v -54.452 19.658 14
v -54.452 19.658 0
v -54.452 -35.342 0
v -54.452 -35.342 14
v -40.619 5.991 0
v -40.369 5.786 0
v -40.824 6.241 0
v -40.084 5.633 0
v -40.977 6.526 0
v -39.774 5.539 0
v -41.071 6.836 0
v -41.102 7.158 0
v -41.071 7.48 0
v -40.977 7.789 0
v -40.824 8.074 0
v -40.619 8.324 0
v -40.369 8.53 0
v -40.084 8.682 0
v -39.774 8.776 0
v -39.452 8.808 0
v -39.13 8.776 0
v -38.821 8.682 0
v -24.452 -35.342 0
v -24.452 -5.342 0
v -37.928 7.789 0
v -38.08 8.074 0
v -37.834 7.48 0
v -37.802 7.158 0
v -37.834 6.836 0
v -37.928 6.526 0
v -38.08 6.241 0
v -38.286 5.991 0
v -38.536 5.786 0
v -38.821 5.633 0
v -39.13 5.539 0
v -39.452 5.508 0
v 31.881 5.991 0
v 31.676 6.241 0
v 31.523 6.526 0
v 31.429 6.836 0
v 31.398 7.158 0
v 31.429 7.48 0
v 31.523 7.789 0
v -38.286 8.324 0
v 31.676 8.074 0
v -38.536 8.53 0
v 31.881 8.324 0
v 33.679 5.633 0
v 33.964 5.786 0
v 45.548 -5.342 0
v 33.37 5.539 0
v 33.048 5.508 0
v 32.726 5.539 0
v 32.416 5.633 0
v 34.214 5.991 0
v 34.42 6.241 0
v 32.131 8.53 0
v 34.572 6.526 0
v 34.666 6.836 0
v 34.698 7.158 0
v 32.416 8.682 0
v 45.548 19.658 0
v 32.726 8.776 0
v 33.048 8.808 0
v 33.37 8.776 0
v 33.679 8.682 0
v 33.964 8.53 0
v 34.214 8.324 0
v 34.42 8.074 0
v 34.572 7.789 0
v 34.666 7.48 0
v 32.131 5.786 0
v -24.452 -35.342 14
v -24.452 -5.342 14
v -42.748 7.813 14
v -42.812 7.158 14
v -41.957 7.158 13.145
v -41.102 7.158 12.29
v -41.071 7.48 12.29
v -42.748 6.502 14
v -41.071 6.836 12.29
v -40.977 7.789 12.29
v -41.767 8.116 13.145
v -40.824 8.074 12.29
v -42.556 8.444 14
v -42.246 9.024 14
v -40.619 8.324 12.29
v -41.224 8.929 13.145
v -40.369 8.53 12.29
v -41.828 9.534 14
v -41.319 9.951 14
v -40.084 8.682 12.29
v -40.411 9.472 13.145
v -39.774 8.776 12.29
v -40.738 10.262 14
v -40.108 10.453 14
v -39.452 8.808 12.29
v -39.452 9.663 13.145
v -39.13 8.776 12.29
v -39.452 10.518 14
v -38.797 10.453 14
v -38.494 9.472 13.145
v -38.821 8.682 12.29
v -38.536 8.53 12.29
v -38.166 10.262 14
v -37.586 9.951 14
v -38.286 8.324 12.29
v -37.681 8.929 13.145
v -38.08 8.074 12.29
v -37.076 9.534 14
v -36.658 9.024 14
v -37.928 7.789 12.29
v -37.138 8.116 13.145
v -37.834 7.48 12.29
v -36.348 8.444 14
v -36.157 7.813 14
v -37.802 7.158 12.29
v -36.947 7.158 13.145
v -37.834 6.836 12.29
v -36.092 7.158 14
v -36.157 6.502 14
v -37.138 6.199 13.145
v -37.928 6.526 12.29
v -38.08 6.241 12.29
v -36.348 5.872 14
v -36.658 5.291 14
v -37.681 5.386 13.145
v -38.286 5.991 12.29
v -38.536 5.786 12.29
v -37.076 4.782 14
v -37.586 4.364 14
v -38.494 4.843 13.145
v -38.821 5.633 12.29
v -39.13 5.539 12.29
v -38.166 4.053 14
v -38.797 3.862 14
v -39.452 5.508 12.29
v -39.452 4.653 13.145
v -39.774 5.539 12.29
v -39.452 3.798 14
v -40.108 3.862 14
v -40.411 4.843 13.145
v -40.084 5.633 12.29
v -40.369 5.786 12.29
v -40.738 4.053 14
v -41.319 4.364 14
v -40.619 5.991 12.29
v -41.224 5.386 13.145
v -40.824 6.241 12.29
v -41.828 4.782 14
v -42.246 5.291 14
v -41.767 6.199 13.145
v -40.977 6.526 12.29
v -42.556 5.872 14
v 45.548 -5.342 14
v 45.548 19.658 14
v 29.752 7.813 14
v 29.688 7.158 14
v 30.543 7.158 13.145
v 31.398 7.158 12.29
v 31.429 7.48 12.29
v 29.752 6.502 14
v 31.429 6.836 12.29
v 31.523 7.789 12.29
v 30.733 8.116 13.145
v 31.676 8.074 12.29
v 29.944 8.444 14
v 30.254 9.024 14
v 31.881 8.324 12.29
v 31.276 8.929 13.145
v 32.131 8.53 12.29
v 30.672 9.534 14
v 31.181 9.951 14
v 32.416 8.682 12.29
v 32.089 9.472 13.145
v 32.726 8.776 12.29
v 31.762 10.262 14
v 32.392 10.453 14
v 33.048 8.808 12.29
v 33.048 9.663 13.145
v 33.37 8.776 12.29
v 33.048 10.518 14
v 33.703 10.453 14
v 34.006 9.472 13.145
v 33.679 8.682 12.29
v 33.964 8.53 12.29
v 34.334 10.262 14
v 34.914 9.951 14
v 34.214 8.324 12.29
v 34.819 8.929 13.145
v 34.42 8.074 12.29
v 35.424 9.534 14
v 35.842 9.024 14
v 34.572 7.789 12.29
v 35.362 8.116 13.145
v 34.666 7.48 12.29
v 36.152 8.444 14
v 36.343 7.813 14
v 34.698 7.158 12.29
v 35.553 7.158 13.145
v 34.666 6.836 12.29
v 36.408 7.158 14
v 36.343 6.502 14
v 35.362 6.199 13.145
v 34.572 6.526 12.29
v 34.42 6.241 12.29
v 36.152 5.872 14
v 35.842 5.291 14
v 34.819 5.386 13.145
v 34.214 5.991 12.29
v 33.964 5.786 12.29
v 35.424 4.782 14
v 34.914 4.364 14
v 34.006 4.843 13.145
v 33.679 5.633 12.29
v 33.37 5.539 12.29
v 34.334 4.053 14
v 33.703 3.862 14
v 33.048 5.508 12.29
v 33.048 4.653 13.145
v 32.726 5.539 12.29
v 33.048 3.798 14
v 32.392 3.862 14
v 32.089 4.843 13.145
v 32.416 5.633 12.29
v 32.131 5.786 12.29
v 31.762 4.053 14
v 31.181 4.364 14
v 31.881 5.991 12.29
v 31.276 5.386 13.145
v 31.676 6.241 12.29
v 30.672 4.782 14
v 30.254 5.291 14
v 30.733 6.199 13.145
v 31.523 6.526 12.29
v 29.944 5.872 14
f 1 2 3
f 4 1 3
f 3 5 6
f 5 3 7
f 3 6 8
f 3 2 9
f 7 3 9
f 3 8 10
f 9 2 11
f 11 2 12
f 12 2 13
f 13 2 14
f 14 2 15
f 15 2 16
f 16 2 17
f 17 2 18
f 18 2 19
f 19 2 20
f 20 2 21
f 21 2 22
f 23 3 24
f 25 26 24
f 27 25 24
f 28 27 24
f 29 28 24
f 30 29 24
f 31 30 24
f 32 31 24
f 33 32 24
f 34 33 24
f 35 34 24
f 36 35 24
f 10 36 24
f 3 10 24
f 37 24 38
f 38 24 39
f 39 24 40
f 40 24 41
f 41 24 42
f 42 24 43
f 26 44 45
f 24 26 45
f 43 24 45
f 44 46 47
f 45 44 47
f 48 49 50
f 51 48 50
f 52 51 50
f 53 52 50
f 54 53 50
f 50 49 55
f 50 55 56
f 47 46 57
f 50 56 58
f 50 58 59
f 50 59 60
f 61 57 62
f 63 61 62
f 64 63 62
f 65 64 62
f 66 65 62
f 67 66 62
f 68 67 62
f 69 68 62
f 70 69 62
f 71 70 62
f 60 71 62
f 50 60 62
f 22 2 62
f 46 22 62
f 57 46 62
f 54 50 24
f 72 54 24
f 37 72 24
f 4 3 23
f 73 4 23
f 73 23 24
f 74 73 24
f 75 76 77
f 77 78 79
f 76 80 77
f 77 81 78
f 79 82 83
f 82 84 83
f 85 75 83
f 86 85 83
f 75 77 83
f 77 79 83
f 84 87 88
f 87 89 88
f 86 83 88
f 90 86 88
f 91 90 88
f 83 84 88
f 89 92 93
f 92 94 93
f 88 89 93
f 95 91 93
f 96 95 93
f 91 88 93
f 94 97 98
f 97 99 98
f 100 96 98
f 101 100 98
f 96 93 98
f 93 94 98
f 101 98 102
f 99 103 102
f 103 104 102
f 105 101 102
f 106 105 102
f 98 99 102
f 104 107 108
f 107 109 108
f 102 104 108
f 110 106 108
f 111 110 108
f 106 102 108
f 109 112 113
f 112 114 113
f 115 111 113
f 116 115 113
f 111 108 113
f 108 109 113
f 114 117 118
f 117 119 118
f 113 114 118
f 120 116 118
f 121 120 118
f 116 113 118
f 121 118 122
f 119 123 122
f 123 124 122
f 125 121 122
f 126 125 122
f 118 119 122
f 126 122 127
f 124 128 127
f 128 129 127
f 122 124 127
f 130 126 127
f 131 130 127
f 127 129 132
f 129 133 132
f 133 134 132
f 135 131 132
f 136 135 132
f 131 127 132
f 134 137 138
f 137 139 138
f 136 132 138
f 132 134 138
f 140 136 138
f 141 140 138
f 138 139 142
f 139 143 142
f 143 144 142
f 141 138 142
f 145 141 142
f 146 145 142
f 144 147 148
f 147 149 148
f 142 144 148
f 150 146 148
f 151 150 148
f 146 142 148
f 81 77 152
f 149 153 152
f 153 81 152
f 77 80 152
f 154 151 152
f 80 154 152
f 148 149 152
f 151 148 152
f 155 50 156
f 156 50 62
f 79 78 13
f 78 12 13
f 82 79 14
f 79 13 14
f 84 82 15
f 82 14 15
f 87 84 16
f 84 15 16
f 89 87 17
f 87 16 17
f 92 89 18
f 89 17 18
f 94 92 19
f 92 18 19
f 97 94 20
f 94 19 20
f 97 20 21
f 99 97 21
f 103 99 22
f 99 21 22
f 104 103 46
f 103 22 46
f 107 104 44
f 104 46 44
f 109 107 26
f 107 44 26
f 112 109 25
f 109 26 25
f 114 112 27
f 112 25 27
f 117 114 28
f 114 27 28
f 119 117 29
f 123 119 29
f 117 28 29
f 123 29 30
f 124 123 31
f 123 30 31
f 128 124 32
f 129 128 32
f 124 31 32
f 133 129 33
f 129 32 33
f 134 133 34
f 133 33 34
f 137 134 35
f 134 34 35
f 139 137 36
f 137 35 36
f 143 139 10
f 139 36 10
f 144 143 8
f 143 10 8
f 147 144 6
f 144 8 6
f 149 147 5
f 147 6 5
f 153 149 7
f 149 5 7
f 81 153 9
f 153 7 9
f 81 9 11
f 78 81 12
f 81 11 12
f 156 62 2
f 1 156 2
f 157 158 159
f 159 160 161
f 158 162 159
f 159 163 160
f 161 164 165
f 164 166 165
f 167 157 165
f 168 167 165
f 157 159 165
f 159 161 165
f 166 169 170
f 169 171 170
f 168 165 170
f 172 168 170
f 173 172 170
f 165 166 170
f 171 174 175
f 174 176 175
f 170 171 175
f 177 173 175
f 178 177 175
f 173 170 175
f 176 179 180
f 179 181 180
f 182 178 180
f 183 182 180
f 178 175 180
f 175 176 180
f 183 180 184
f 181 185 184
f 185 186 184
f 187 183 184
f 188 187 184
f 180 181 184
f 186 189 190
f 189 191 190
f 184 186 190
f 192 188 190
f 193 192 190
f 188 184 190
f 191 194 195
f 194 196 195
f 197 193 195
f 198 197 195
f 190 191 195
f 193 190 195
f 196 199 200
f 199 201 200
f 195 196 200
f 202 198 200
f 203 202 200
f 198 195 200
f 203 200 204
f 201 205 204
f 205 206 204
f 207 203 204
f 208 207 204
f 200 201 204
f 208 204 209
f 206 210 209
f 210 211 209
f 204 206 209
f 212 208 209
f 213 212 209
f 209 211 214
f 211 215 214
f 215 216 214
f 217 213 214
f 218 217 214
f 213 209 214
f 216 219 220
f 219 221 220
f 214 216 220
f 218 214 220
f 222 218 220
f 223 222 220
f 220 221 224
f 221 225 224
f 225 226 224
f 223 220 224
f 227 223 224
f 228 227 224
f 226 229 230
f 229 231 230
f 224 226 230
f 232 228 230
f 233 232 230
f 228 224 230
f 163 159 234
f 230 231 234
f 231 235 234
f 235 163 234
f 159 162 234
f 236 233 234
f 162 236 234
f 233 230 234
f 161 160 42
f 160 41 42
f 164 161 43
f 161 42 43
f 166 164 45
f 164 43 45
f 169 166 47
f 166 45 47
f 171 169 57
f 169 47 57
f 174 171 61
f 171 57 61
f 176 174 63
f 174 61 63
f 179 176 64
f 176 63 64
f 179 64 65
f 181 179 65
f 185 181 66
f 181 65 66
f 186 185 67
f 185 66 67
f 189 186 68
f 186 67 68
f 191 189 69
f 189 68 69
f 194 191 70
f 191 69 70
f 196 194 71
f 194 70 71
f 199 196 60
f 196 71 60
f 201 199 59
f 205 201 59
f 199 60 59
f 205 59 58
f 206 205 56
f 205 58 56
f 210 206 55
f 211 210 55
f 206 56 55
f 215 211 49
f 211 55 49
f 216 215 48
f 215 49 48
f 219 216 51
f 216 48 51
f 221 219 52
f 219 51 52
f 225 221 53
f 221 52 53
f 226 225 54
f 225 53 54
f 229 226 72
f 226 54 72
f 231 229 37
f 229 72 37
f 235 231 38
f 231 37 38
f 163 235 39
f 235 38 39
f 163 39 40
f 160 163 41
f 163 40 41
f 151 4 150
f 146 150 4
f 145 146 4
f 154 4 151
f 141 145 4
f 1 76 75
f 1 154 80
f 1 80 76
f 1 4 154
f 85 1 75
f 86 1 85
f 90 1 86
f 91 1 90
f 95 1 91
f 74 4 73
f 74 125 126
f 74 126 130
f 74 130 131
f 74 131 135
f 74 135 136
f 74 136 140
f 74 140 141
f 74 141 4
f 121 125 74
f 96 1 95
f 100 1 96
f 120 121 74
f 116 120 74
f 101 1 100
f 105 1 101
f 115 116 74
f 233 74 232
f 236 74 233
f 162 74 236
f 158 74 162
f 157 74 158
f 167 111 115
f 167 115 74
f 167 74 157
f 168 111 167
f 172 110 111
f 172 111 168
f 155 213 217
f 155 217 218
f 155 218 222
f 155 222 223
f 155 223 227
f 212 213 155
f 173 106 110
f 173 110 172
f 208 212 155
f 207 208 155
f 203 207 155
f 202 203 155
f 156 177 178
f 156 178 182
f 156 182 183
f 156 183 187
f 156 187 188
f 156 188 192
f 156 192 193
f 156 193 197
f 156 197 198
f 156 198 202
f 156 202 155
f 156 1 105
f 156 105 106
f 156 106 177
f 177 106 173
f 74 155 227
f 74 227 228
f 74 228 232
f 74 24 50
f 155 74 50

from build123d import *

# Parameters (mm, degrees)
F1_DEPTH       = 14
F3_D           = 3.3
F3_CSINK_D     = 6.72
F3_CSINK_ANGLE = 90


with BuildPart() as f1:
    # F0 (on Top) → F1 (new body)
    with BuildSketch(Plane.XY):
        Polygon((45.5477632582, 19.6576939523), (-54.4522367418, 19.6576939523), (-54.4522367418, -35.3423060477), (-24.4522367418, -35.3423060477), (-24.4522367418, -5.3423060477), (45.5477632582, -5.3423060477), align=None)
    extrude(amount=F1_DEPTH)

    # F3 (through all)
    with Locations(Plane.XY.offset(14)):
        with Locations((-39.4522367418, 7.1576939523), (33.0477632582, 7.1576939523)):
            CounterSinkHole(F3_D / 2, F3_CSINK_D / 2, counter_sink_angle=F3_CSINK_ANGLE)


solid = f1.part
